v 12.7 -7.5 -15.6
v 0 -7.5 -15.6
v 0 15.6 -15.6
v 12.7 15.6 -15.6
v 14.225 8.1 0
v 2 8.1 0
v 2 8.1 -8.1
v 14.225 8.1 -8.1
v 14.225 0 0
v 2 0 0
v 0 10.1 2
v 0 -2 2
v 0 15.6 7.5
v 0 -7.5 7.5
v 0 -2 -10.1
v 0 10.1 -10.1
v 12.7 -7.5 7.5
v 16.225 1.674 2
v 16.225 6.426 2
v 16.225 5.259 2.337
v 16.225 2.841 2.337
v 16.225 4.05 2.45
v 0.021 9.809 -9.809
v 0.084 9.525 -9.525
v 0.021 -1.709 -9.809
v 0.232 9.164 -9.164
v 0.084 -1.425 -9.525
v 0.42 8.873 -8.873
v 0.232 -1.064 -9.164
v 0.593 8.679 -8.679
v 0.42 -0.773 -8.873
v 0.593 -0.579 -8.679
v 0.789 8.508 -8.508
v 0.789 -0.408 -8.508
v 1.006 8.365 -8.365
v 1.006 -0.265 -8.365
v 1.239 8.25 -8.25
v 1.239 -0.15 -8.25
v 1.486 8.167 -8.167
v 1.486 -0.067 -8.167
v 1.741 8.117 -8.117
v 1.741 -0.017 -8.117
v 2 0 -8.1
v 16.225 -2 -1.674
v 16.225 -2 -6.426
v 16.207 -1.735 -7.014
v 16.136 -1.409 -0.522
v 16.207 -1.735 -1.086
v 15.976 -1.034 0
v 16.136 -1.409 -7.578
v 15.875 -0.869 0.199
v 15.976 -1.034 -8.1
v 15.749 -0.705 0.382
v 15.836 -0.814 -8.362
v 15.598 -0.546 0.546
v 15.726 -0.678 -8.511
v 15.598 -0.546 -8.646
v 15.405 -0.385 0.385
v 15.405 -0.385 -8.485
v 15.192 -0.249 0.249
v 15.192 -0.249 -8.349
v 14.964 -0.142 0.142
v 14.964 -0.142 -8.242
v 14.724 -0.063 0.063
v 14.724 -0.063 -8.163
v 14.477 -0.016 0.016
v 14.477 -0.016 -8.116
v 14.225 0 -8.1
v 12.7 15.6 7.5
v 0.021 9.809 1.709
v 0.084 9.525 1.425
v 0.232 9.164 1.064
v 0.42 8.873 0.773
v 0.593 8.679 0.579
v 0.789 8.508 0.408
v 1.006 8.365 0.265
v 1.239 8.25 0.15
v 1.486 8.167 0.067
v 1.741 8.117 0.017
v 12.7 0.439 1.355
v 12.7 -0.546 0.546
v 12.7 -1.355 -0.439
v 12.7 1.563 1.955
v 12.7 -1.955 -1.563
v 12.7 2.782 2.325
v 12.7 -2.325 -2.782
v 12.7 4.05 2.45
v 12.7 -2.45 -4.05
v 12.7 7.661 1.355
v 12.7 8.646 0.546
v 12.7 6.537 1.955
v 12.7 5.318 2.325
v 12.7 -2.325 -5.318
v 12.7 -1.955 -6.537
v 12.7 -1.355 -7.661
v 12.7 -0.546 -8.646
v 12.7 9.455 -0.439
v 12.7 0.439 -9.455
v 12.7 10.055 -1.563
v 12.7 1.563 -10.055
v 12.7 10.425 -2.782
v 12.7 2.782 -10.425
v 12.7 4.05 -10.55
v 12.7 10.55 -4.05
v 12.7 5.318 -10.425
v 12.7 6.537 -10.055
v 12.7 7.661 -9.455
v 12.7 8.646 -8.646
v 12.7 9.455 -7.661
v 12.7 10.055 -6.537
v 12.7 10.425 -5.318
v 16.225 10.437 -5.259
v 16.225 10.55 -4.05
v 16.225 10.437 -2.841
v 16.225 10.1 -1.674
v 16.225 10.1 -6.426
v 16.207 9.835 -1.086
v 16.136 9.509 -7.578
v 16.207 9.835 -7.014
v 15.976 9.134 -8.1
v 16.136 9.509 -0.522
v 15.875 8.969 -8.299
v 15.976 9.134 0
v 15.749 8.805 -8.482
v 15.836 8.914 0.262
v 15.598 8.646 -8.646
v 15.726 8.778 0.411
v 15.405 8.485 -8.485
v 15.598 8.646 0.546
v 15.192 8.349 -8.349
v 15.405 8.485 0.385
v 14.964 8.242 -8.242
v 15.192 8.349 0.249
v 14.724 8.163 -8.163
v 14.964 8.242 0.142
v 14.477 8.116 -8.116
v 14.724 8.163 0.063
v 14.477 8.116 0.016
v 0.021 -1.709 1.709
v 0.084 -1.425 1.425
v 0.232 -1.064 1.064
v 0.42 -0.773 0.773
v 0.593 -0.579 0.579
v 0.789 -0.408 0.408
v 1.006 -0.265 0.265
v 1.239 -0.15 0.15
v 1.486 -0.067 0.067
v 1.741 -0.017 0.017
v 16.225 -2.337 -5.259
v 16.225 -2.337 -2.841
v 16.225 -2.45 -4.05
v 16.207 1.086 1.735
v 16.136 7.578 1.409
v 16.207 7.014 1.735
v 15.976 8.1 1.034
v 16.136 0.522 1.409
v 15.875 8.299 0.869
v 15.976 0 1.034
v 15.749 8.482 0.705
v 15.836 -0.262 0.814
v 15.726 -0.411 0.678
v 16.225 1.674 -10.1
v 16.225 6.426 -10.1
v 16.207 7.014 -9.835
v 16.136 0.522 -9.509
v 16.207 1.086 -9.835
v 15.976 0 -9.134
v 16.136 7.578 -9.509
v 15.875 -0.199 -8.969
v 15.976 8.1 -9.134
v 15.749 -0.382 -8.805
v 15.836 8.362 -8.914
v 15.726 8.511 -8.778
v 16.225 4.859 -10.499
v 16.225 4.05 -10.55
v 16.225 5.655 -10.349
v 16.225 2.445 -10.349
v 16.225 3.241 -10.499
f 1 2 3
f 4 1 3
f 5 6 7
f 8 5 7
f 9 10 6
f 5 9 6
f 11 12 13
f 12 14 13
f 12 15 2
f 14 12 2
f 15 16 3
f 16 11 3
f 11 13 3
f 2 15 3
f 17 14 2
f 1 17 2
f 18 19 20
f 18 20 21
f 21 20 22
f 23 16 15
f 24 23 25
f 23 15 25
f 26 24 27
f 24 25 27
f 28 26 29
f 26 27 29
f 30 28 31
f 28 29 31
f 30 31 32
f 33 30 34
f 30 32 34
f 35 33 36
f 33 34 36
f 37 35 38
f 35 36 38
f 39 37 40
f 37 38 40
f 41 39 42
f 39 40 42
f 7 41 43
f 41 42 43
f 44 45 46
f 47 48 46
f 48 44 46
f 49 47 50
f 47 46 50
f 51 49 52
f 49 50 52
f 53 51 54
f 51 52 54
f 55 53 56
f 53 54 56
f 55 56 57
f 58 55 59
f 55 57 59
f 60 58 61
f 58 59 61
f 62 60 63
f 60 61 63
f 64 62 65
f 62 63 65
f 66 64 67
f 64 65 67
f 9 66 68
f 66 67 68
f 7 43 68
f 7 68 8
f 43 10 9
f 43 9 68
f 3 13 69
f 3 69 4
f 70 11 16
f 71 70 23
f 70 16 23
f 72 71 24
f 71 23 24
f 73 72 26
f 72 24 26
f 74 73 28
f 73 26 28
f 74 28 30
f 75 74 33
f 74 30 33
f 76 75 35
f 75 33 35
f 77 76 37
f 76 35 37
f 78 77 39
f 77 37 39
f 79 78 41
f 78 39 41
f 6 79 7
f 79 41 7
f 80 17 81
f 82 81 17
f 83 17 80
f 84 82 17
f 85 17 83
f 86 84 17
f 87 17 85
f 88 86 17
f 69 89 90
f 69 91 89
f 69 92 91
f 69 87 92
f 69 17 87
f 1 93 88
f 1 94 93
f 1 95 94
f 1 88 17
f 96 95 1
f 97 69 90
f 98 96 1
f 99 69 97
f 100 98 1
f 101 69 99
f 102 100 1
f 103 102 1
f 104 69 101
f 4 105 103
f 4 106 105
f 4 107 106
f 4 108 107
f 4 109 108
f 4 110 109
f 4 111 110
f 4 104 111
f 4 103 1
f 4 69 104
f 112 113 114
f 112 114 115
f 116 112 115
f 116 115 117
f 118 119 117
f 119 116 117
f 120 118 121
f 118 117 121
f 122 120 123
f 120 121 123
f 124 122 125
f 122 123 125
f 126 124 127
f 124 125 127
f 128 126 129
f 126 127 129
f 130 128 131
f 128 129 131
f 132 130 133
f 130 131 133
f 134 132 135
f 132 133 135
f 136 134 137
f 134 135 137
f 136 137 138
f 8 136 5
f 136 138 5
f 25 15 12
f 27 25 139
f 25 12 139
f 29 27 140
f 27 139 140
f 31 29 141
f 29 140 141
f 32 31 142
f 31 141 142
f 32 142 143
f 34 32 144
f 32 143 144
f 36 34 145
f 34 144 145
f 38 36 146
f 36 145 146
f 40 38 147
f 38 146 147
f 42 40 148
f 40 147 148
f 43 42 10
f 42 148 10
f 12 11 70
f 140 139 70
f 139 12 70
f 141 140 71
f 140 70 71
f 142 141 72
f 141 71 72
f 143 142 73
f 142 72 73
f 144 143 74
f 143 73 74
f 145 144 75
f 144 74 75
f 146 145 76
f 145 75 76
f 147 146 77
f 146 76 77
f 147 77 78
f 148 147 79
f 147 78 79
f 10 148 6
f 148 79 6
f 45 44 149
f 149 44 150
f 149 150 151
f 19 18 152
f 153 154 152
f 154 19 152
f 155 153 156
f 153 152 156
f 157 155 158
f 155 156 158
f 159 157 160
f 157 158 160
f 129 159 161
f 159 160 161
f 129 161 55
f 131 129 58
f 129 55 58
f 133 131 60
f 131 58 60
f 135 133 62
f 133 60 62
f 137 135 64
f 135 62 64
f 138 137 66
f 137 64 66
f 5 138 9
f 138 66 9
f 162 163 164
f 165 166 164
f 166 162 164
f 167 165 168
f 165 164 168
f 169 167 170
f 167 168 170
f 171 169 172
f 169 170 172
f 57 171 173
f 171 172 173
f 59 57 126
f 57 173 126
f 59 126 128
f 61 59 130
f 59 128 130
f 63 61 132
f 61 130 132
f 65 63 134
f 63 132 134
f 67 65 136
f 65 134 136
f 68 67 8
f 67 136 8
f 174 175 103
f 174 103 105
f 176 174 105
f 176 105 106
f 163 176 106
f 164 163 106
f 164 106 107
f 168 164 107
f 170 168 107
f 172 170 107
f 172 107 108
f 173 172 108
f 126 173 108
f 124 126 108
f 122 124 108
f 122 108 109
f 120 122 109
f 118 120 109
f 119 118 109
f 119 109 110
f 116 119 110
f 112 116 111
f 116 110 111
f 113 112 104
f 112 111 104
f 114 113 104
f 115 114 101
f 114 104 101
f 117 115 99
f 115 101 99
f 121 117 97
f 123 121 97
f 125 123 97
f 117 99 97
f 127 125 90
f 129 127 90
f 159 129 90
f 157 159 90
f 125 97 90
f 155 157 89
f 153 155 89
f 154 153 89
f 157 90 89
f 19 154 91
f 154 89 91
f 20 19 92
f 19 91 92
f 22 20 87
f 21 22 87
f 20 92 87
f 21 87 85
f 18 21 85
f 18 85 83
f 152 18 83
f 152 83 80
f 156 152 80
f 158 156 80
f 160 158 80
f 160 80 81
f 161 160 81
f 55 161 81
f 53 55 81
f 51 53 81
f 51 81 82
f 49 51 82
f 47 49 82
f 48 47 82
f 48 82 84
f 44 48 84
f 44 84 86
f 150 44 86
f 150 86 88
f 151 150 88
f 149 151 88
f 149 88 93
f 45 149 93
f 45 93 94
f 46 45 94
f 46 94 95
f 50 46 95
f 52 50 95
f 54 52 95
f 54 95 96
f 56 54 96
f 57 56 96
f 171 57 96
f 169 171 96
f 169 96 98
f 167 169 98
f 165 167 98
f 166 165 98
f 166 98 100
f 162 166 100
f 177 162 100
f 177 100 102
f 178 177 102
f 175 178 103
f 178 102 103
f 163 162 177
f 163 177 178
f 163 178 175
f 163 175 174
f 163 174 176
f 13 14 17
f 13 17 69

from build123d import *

# Parameters (mm, degrees)
SKETCH2_W           = 23.1
SKETCH2_H           = 23.1
SKETCH2_W_2         = 8.1
SKETCH2_H_2         = 8.1
EXTRUDE_THIN1_DEPTH = 12.7
SKETCH3_R           = 6.5
SKETCH3_W           = 8.1
SKETCH3_H           = 8.1
BOSS_EXTRUDE1_DEPTH = 3.525
FILLET1_R           = 2


with BuildPart() as part:
    # Sketch2 → Extrude-Thin1 (new body)
    with BuildSketch(Plane(origin=(0, 0, 0), x_dir=(0, 0, -1), z_dir=(1, 0, 0))):
        with Locations((4.05, 4.05)):
            Rectangle(SKETCH2_W, SKETCH2_H)
        with Locations((4.05, 4.05)):
            Rectangle(SKETCH2_W_2, SKETCH2_H_2, mode=Mode.SUBTRACT)
    extrude(amount=EXTRUDE_THIN1_DEPTH)

    # Sketch3 → Boss-Extrude1 (add)
    with BuildSketch(Plane(origin=(12.7, 0, 0), x_dir=(0, 0, -1), z_dir=(1, 0, 0))):
        with Locations((4.05, 4.05)):
            Circle(SKETCH3_R)
        with Locations((4.05, 4.05)):
            Rectangle(SKETCH3_W, SKETCH3_H, mode=Mode.SUBTRACT)
    extrude(amount=BOSS_EXTRUDE1_DEPTH)

    # Fillet1
    # the kernel refuses this fillet: 2 mm, written as the material it takes off along each edge
    with BuildSketch(Plane(origin=(0, 8.1, 0), x_dir=(1, 0, 0), z_dir=(0, -1, 0)), Plane(origin=(0, 0, 0), x_dir=(1, 0, 0), z_dir=(0, 0, -1)), Plane(origin=(0, 0, -8.1), x_dir=(1, 0, 0), z_dir=(0, 1, 0)), Plane(origin=(0, 8.1, -8.1), x_dir=(1, 0, 0), z_dir=(0, 0, 1))) as fillet1_piece_1:
        with BuildLine():
            CenterArc((FILLET1_R, FILLET1_R), FILLET1_R, 180, 90)
            Line((0, FILLET1_R), (-FILLET1_R * 0.02, FILLET1_R))
            Line((-FILLET1_R * 0.02, FILLET1_R), (-FILLET1_R * 0.02, -FILLET1_R * 0.02))
            Line((-FILLET1_R * 0.02, -FILLET1_R * 0.02), (FILLET1_R, -FILLET1_R * 0.02))
            Line((FILLET1_R, -FILLET1_R * 0.02), (FILLET1_R, 0))
        make_face()
    extrude(amount=8.1, mode=Mode.SUBTRACT)
    with BuildSketch(Plane(origin=(16.225, 0, -8.1), x_dir=(0, -1, 0), z_dir=(0, 0, 1)), Plane(origin=(16.225, 8.1, -8.1), x_dir=(0, 0, -1), z_dir=(0, -1, 0)), Plane(origin=(16.225, 8.1, 0), x_dir=(0, 1, 0), z_dir=(0, 0, -1)), Plane(origin=(16.225, 0, 0), x_dir=(0, 0, 1), z_dir=(0, 1, 0))) as fillet1_piece_2:
        with BuildLine():
            CenterArc((FILLET1_R, -FILLET1_R), FILLET1_R, 90, 90)
            Line((0, -FILLET1_R), (-FILLET1_R * 0.02, -FILLET1_R))
            Line((-FILLET1_R * 0.02, -FILLET1_R), (-FILLET1_R * 0.02, FILLET1_R * 0.02))
            Line((-FILLET1_R * 0.02, FILLET1_R * 0.02), (FILLET1_R, FILLET1_R * 0.02))
            Line((FILLET1_R, FILLET1_R * 0.02), (FILLET1_R, 0))
        make_face()
    extrude(amount=8.1, mode=Mode.SUBTRACT)
    with BuildSketch(Plane(origin=(0, 13.1, 0), x_dir=(1, 0, 0), z_dir=(0, -1, 0))) as fillet1_piece_3a_section:
        with BuildLine():
            CenterArc((FILLET1_R, FILLET1_R), FILLET1_R, 180, 90)
            Line((0, FILLET1_R), (-FILLET1_R * 0.02, FILLET1_R))
            Line((-FILLET1_R * 0.02, FILLET1_R), (-FILLET1_R * 0.02, -FILLET1_R * 0.02))
            Line((-FILLET1_R * 0.02, -FILLET1_R * 0.02), (FILLET1_R, -FILLET1_R * 0.02))
            Line((FILLET1_R, -FILLET1_R * 0.02), (FILLET1_R, 0))
        make_face()
    fillet1_piece_3a = extrude(amount=13.1, mode=Mode.PRIVATE)
    fillet1_piece_3a = split(fillet1_piece_3a, bisect_by=Plane(origin=(0.452790229, 8.1, 0.452790229), z_dir=(0, 1, 0)), keep=Keep.TOP, mode=Mode.PRIVATE)
    with BuildSketch(Plane(origin=(0, 8.1, -8.1), x_dir=(1, 0, 0), z_dir=(0, 0, 1))) as fillet1_piece_3b_section:
        with BuildLine():
            CenterArc((FILLET1_R, FILLET1_R), FILLET1_R, 180, 90)
            Line((0, FILLET1_R), (-FILLET1_R * 0.02, FILLET1_R))
            Line((-FILLET1_R * 0.02, FILLET1_R), (-FILLET1_R * 0.02, -FILLET1_R * 0.02))
            Line((-FILLET1_R * 0.02, -FILLET1_R * 0.02), (FILLET1_R, -FILLET1_R * 0.02))
            Line((FILLET1_R, -FILLET1_R * 0.02), (FILLET1_R, 0))
        make_face()
    fillet1_piece_3b = extrude(amount=13.1, mode=Mode.PRIVATE)
    fillet1_piece_3b = split(fillet1_piece_3b, bisect_by=Plane(origin=(0.452790229, 8.552790229, 0), z_dir=(0, 0, 1)), keep=Keep.TOP, mode=Mode.PRIVATE)
    fillet1_piece_3 = fillet1_piece_3a & fillet1_piece_3b
    add(fillet1_piece_3, mode=Mode.SUBTRACT)
    with BuildSketch(Plane(origin=(0, 8.1, 0), x_dir=(1, 0, 0), z_dir=(0, -1, 0))) as fillet1_piece_4a_section:
        with BuildLine():
            CenterArc((FILLET1_R, FILLET1_R), FILLET1_R, 180, 90)
            Line((0, FILLET1_R), (-FILLET1_R * 0.02, FILLET1_R))
            Line((-FILLET1_R * 0.02, FILLET1_R), (-FILLET1_R * 0.02, -FILLET1_R * 0.02))
            Line((-FILLET1_R * 0.02, -FILLET1_R * 0.02), (FILLET1_R, -FILLET1_R * 0.02))
            Line((FILLET1_R, -FILLET1_R * 0.02), (FILLET1_R, 0))
        make_face()
    fillet1_piece_4a = extrude(amount=13.1, mode=Mode.PRIVATE)
    fillet1_piece_4a = split(fillet1_piece_4a, bisect_by=Plane(origin=(0.452790229, 0, 0.452790229), z_dir=(0, -1, 0)), keep=Keep.TOP, mode=Mode.PRIVATE)
    with BuildSketch(Plane(origin=(0, 0, 5), x_dir=(1, 0, 0), z_dir=(0, 0, -1))) as fillet1_piece_4b_section:
        with BuildLine():
            CenterArc((FILLET1_R, FILLET1_R), FILLET1_R, 180, 90)
            Line((0, FILLET1_R), (-FILLET1_R * 0.02, FILLET1_R))
            Line((-FILLET1_R * 0.02, FILLET1_R), (-FILLET1_R * 0.02, -FILLET1_R * 0.02))
            Line((-FILLET1_R * 0.02, -FILLET1_R * 0.02), (FILLET1_R, -FILLET1_R * 0.02))
            Line((FILLET1_R, -FILLET1_R * 0.02), (FILLET1_R, 0))
        make_face()
    fillet1_piece_4b = extrude(amount=13.1, mode=Mode.PRIVATE)
    fillet1_piece_4b = split(fillet1_piece_4b, bisect_by=Plane(origin=(0.452790229, -0.452790229, 0), z_dir=(0, 0, 1)), keep=Keep.TOP, mode=Mode.PRIVATE)
    fillet1_piece_4 = fillet1_piece_4a & fillet1_piece_4b
    add(fillet1_piece_4, mode=Mode.SUBTRACT)
    with BuildSketch(Plane(origin=(0, 0, 0), x_dir=(1, 0, 0), z_dir=(0, 0, -1))) as fillet1_piece_5a_section:
        with BuildLine():
            CenterArc((FILLET1_R, FILLET1_R), FILLET1_R, 180, 90)
            Line((0, FILLET1_R), (-FILLET1_R * 0.02, FILLET1_R))
            Line((-FILLET1_R * 0.02, FILLET1_R), (-FILLET1_R * 0.02, -FILLET1_R * 0.02))
            Line((-FILLET1_R * 0.02, -FILLET1_R * 0.02), (FILLET1_R, -FILLET1_R * 0.02))
            Line((FILLET1_R, -FILLET1_R * 0.02), (FILLET1_R, 0))
        make_face()
    fillet1_piece_5a = extrude(amount=13.1, mode=Mode.PRIVATE)
    fillet1_piece_5a = split(fillet1_piece_5a, bisect_by=Plane(origin=(0.452790229, -0.452790229, -8.1), z_dir=(0, 0, -1)), keep=Keep.TOP, mode=Mode.PRIVATE)
    with BuildSketch(Plane(origin=(0, -5, -8.1), x_dir=(1, 0, 0), z_dir=(0, 1, 0))) as fillet1_piece_5b_section:
        with BuildLine():
            CenterArc((FILLET1_R, FILLET1_R), FILLET1_R, 180, 90)
            Line((0, FILLET1_R), (-FILLET1_R * 0.02, FILLET1_R))
            Line((-FILLET1_R * 0.02, FILLET1_R), (-FILLET1_R * 0.02, -FILLET1_R * 0.02))
            Line((-FILLET1_R * 0.02, -FILLET1_R * 0.02), (FILLET1_R, -FILLET1_R * 0.02))
            Line((FILLET1_R, -FILLET1_R * 0.02), (FILLET1_R, 0))
        make_face()
    fillet1_piece_5b = extrude(amount=13.1, mode=Mode.PRIVATE)
    fillet1_piece_5b = split(fillet1_piece_5b, bisect_by=Plane(origin=(0.452790229, 0, -8.552790229), z_dir=(0, -1, 0)), keep=Keep.TOP, mode=Mode.PRIVATE)
    fillet1_piece_5 = fillet1_piece_5a & fillet1_piece_5b
    add(fillet1_piece_5, mode=Mode.SUBTRACT)
    with BuildSketch(Plane(origin=(0, 0, -8.1), x_dir=(1, 0, 0), z_dir=(0, 1, 0))) as fillet1_piece_6a_section:
        with BuildLine():
            CenterArc((FILLET1_R, FILLET1_R), FILLET1_R, 180, 90)
            Line((0, FILLET1_R), (-FILLET1_R * 0.02, FILLET1_R))
            Line((-FILLET1_R * 0.02, FILLET1_R), (-FILLET1_R * 0.02, -FILLET1_R * 0.02))
            Line((-FILLET1_R * 0.02, -FILLET1_R * 0.02), (FILLET1_R, -FILLET1_R * 0.02))
            Line((FILLET1_R, -FILLET1_R * 0.02), (FILLET1_R, 0))
        make_face()
    fillet1_piece_6a = extrude(amount=13.1, mode=Mode.PRIVATE)
    fillet1_piece_6a = split(fillet1_piece_6a, bisect_by=Plane(origin=(0.452790229, 8.1, -8.552790229), z_dir=(0, 1, 0)), keep=Keep.TOP, mode=Mode.PRIVATE)
    with BuildSketch(Plane(origin=(0, 8.1, -13.1), x_dir=(1, 0, 0), z_dir=(0, 0, 1))) as fillet1_piece_6b_section:
        with BuildLine():
            CenterArc((FILLET1_R, FILLET1_R), FILLET1_R, 180, 90)
            Line((0, FILLET1_R), (-FILLET1_R * 0.02, FILLET1_R))
            Line((-FILLET1_R * 0.02, FILLET1_R), (-FILLET1_R * 0.02, -FILLET1_R * 0.02))
            Line((-FILLET1_R * 0.02, -FILLET1_R * 0.02), (FILLET1_R, -FILLET1_R * 0.02))
            Line((FILLET1_R, -FILLET1_R * 0.02), (FILLET1_R, 0))
        make_face()
    fillet1_piece_6b = extrude(amount=13.1, mode=Mode.PRIVATE)
    fillet1_piece_6b = split(fillet1_piece_6b, bisect_by=Plane(origin=(0.452790229, 8.552790229, -8.1), z_dir=(0, 0, -1)), keep=Keep.TOP, mode=Mode.PRIVATE)
    fillet1_piece_6 = fillet1_piece_6a & fillet1_piece_6b
    add(fillet1_piece_6, mode=Mode.SUBTRACT)
    with BuildSketch(Plane(origin=(16.225, 8.1, -8.1), x_dir=(0, 0, -1), z_dir=(0, -1, 0))) as fillet1_piece_7a_section:
        with BuildLine():
            CenterArc((FILLET1_R, -FILLET1_R), FILLET1_R, 90, 90)
            Line((0, -FILLET1_R), (-FILLET1_R * 0.02, -FILLET1_R))
            Line((-FILLET1_R * 0.02, -FILLET1_R), (-FILLET1_R * 0.02, FILLET1_R * 0.02))
            Line((-FILLET1_R * 0.02, FILLET1_R * 0.02), (FILLET1_R, FILLET1_R * 0.02))
            Line((FILLET1_R, FILLET1_R * 0.02), (FILLET1_R, 0))
        make_face()
    fillet1_piece_7a = extrude(amount=13.1, mode=Mode.PRIVATE)
    fillet1_piece_7a = split(fillet1_piece_7a, bisect_by=Plane(origin=(15.772209771, 0, -8.552790229), z_dir=(0, -1, 0)), keep=Keep.TOP, mode=Mode.PRIVATE)
    with BuildSketch(Plane(origin=(16.225, 0, -13.1), x_dir=(0, -1, 0), z_dir=(0, 0, 1))) as fillet1_piece_7b_section:
        with BuildLine():
            CenterArc((FILLET1_R, -FILLET1_R), FILLET1_R, 90, 90)
            Line((0, -FILLET1_R), (-FILLET1_R * 0.02, -FILLET1_R))
            Line((-FILLET1_R * 0.02, -FILLET1_R), (-FILLET1_R * 0.02, FILLET1_R * 0.02))
            Line((-FILLET1_R * 0.02, FILLET1_R * 0.02), (FILLET1_R, FILLET1_R * 0.02))
            Line((FILLET1_R, FILLET1_R * 0.02), (FILLET1_R, 0))
        make_face()
    fillet1_piece_7b = extrude(amount=13.1, mode=Mode.PRIVATE)
    fillet1_piece_7b = split(fillet1_piece_7b, bisect_by=Plane(origin=(15.772209771, -0.452790229, -8.1), z_dir=(0, 0, -1)), keep=Keep.TOP, mode=Mode.PRIVATE)
    fillet1_piece_7 = fillet1_piece_7a & fillet1_piece_7b
    add(fillet1_piece_7, mode=Mode.SUBTRACT)
    with BuildSketch(Plane(origin=(16.225, 0, -8.1), x_dir=(0, -1, 0), z_dir=(0, 0, 1))) as fillet1_piece_8a_section:
        with BuildLine():
            CenterArc((FILLET1_R, -FILLET1_R), FILLET1_R, 90, 90)
            Line((0, -FILLET1_R), (-FILLET1_R * 0.02, -FILLET1_R))
            Line((-FILLET1_R * 0.02, -FILLET1_R), (-FILLET1_R * 0.02, FILLET1_R * 0.02))
            Line((-FILLET1_R * 0.02, FILLET1_R * 0.02), (FILLET1_R, FILLET1_R * 0.02))
            Line((FILLET1_R, FILLET1_R * 0.02), (FILLET1_R, 0))
        make_face()
    fillet1_piece_8a = extrude(amount=13.1, mode=Mode.PRIVATE)
    fillet1_piece_8a = split(fillet1_piece_8a, bisect_by=Plane(origin=(15.772209771, -0.452790229, 0), z_dir=(0, 0, 1)), keep=Keep.TOP, mode=Mode.PRIVATE)
    with BuildSketch(Plane(origin=(16.225, -5, 0), x_dir=(0, 0, 1), z_dir=(0, 1, 0))) as fillet1_piece_8b_section:
        with BuildLine():
            CenterArc((FILLET1_R, -FILLET1_R), FILLET1_R, 90, 90)
            Line((0, -FILLET1_R), (-FILLET1_R * 0.02, -FILLET1_R))
            Line((-FILLET1_R * 0.02, -FILLET1_R), (-FILLET1_R * 0.02, FILLET1_R * 0.02))
            Line((-FILLET1_R * 0.02, FILLET1_R * 0.02), (FILLET1_R, FILLET1_R * 0.02))
            Line((FILLET1_R, FILLET1_R * 0.02), (FILLET1_R, 0))
        make_face()
    fillet1_piece_8b = extrude(amount=13.1, mode=Mode.PRIVATE)
    fillet1_piece_8b = split(fillet1_piece_8b, bisect_by=Plane(origin=(15.772209771, 0, 0.452790229), z_dir=(0, -1, 0)), keep=Keep.TOP, mode=Mode.PRIVATE)
    fillet1_piece_8 = fillet1_piece_8a & fillet1_piece_8b
    add(fillet1_piece_8, mode=Mode.SUBTRACT)
    with BuildSketch(Plane(origin=(16.225, 8.1, 0), x_dir=(0, 1, 0), z_dir=(0, 0, -1))) as fillet1_piece_9a_section:
        with BuildLine():
            CenterArc((FILLET1_R, -FILLET1_R), FILLET1_R, 90, 90)
            Line((0, -FILLET1_R), (-FILLET1_R * 0.02, -FILLET1_R))
            Line((-FILLET1_R * 0.02, -FILLET1_R), (-FILLET1_R * 0.02, FILLET1_R * 0.02))
            Line((-FILLET1_R * 0.02, FILLET1_R * 0.02), (FILLET1_R, FILLET1_R * 0.02))
            Line((FILLET1_R, FILLET1_R * 0.02), (FILLET1_R, 0))
        make_face()
    fillet1_piece_9a = extrude(amount=13.1, mode=Mode.PRIVATE)
    fillet1_piece_9a = split(fillet1_piece_9a, bisect_by=Plane(origin=(15.772209771, 8.552790229, -8.1), z_dir=(0, 0, -1)), keep=Keep.TOP, mode=Mode.PRIVATE)
    with BuildSketch(Plane(origin=(16.225, 13.1, -8.1), x_dir=(0, 0, -1), z_dir=(0, -1, 0))) as fillet1_piece_9b_section:
        with BuildLine():
            CenterArc((FILLET1_R, -FILLET1_R), FILLET1_R, 90, 90)
            Line((0, -FILLET1_R), (-FILLET1_R * 0.02, -FILLET1_R))
            Line((-FILLET1_R * 0.02, -FILLET1_R), (-FILLET1_R * 0.02, FILLET1_R * 0.02))
            Line((-FILLET1_R * 0.02, FILLET1_R * 0.02), (FILLET1_R, FILLET1_R * 0.02))
            Line((FILLET1_R, FILLET1_R * 0.02), (FILLET1_R, 0))
        make_face()
    fillet1_piece_9b = extrude(amount=13.1, mode=Mode.PRIVATE)
    fillet1_piece_9b = split(fillet1_piece_9b, bisect_by=Plane(origin=(15.772209771, 8.1, -8.552790229), z_dir=(0, 1, 0)), keep=Keep.TOP, mode=Mode.PRIVATE)
    fillet1_piece_9 = fillet1_piece_9a & fillet1_piece_9b
    add(fillet1_piece_9, mode=Mode.SUBTRACT)
    with BuildSketch(Plane(origin=(16.225, 8.1, 5), x_dir=(0, 1, 0), z_dir=(0, 0, -1))) as fillet1_piece_10a_section:
        with BuildLine():
            CenterArc((FILLET1_R, -FILLET1_R), FILLET1_R, 90, 90)
            Line((0, -FILLET1_R), (-FILLET1_R * 0.02, -FILLET1_R))
            Line((-FILLET1_R * 0.02, -FILLET1_R), (-FILLET1_R * 0.02, FILLET1_R * 0.02))
            Line((-FILLET1_R * 0.02, FILLET1_R * 0.02), (FILLET1_R, FILLET1_R * 0.02))
            Line((FILLET1_R, FILLET1_R * 0.02), (FILLET1_R, 0))
        make_face()
    fillet1_piece_10a = extrude(amount=13.1, mode=Mode.PRIVATE)
    fillet1_piece_10a = split(fillet1_piece_10a, bisect_by=Plane(origin=(15.772209771, 8.552790229, 0), z_dir=(0, 0, 1)), keep=Keep.TOP, mode=Mode.PRIVATE)
    with BuildSketch(Plane(origin=(16.225, 0, 0), x_dir=(0, 0, 1), z_dir=(0, 1, 0))) as fillet1_piece_10b_section:
        with BuildLine():
            CenterArc((FILLET1_R, -FILLET1_R), FILLET1_R, 90, 90)
            Line((0, -FILLET1_R), (-FILLET1_R * 0.02, -FILLET1_R))
            Line((-FILLET1_R * 0.02, -FILLET1_R), (-FILLET1_R * 0.02, FILLET1_R * 0.02))
            Line((-FILLET1_R * 0.02, FILLET1_R * 0.02), (FILLET1_R, FILLET1_R * 0.02))
            Line((FILLET1_R, FILLET1_R * 0.02), (FILLET1_R, 0))
        make_face()
    fillet1_piece_10b = extrude(amount=13.1, mode=Mode.PRIVATE)
    fillet1_piece_10b = split(fillet1_piece_10b, bisect_by=Plane(origin=(15.772209771, 8.1, 0.452790229), z_dir=(0, 1, 0)), keep=Keep.TOP, mode=Mode.PRIVATE)
    fillet1_piece_10 = fillet1_piece_10a & fillet1_piece_10b
    add(fillet1_piece_10, mode=Mode.SUBTRACT)


solid = part.part
